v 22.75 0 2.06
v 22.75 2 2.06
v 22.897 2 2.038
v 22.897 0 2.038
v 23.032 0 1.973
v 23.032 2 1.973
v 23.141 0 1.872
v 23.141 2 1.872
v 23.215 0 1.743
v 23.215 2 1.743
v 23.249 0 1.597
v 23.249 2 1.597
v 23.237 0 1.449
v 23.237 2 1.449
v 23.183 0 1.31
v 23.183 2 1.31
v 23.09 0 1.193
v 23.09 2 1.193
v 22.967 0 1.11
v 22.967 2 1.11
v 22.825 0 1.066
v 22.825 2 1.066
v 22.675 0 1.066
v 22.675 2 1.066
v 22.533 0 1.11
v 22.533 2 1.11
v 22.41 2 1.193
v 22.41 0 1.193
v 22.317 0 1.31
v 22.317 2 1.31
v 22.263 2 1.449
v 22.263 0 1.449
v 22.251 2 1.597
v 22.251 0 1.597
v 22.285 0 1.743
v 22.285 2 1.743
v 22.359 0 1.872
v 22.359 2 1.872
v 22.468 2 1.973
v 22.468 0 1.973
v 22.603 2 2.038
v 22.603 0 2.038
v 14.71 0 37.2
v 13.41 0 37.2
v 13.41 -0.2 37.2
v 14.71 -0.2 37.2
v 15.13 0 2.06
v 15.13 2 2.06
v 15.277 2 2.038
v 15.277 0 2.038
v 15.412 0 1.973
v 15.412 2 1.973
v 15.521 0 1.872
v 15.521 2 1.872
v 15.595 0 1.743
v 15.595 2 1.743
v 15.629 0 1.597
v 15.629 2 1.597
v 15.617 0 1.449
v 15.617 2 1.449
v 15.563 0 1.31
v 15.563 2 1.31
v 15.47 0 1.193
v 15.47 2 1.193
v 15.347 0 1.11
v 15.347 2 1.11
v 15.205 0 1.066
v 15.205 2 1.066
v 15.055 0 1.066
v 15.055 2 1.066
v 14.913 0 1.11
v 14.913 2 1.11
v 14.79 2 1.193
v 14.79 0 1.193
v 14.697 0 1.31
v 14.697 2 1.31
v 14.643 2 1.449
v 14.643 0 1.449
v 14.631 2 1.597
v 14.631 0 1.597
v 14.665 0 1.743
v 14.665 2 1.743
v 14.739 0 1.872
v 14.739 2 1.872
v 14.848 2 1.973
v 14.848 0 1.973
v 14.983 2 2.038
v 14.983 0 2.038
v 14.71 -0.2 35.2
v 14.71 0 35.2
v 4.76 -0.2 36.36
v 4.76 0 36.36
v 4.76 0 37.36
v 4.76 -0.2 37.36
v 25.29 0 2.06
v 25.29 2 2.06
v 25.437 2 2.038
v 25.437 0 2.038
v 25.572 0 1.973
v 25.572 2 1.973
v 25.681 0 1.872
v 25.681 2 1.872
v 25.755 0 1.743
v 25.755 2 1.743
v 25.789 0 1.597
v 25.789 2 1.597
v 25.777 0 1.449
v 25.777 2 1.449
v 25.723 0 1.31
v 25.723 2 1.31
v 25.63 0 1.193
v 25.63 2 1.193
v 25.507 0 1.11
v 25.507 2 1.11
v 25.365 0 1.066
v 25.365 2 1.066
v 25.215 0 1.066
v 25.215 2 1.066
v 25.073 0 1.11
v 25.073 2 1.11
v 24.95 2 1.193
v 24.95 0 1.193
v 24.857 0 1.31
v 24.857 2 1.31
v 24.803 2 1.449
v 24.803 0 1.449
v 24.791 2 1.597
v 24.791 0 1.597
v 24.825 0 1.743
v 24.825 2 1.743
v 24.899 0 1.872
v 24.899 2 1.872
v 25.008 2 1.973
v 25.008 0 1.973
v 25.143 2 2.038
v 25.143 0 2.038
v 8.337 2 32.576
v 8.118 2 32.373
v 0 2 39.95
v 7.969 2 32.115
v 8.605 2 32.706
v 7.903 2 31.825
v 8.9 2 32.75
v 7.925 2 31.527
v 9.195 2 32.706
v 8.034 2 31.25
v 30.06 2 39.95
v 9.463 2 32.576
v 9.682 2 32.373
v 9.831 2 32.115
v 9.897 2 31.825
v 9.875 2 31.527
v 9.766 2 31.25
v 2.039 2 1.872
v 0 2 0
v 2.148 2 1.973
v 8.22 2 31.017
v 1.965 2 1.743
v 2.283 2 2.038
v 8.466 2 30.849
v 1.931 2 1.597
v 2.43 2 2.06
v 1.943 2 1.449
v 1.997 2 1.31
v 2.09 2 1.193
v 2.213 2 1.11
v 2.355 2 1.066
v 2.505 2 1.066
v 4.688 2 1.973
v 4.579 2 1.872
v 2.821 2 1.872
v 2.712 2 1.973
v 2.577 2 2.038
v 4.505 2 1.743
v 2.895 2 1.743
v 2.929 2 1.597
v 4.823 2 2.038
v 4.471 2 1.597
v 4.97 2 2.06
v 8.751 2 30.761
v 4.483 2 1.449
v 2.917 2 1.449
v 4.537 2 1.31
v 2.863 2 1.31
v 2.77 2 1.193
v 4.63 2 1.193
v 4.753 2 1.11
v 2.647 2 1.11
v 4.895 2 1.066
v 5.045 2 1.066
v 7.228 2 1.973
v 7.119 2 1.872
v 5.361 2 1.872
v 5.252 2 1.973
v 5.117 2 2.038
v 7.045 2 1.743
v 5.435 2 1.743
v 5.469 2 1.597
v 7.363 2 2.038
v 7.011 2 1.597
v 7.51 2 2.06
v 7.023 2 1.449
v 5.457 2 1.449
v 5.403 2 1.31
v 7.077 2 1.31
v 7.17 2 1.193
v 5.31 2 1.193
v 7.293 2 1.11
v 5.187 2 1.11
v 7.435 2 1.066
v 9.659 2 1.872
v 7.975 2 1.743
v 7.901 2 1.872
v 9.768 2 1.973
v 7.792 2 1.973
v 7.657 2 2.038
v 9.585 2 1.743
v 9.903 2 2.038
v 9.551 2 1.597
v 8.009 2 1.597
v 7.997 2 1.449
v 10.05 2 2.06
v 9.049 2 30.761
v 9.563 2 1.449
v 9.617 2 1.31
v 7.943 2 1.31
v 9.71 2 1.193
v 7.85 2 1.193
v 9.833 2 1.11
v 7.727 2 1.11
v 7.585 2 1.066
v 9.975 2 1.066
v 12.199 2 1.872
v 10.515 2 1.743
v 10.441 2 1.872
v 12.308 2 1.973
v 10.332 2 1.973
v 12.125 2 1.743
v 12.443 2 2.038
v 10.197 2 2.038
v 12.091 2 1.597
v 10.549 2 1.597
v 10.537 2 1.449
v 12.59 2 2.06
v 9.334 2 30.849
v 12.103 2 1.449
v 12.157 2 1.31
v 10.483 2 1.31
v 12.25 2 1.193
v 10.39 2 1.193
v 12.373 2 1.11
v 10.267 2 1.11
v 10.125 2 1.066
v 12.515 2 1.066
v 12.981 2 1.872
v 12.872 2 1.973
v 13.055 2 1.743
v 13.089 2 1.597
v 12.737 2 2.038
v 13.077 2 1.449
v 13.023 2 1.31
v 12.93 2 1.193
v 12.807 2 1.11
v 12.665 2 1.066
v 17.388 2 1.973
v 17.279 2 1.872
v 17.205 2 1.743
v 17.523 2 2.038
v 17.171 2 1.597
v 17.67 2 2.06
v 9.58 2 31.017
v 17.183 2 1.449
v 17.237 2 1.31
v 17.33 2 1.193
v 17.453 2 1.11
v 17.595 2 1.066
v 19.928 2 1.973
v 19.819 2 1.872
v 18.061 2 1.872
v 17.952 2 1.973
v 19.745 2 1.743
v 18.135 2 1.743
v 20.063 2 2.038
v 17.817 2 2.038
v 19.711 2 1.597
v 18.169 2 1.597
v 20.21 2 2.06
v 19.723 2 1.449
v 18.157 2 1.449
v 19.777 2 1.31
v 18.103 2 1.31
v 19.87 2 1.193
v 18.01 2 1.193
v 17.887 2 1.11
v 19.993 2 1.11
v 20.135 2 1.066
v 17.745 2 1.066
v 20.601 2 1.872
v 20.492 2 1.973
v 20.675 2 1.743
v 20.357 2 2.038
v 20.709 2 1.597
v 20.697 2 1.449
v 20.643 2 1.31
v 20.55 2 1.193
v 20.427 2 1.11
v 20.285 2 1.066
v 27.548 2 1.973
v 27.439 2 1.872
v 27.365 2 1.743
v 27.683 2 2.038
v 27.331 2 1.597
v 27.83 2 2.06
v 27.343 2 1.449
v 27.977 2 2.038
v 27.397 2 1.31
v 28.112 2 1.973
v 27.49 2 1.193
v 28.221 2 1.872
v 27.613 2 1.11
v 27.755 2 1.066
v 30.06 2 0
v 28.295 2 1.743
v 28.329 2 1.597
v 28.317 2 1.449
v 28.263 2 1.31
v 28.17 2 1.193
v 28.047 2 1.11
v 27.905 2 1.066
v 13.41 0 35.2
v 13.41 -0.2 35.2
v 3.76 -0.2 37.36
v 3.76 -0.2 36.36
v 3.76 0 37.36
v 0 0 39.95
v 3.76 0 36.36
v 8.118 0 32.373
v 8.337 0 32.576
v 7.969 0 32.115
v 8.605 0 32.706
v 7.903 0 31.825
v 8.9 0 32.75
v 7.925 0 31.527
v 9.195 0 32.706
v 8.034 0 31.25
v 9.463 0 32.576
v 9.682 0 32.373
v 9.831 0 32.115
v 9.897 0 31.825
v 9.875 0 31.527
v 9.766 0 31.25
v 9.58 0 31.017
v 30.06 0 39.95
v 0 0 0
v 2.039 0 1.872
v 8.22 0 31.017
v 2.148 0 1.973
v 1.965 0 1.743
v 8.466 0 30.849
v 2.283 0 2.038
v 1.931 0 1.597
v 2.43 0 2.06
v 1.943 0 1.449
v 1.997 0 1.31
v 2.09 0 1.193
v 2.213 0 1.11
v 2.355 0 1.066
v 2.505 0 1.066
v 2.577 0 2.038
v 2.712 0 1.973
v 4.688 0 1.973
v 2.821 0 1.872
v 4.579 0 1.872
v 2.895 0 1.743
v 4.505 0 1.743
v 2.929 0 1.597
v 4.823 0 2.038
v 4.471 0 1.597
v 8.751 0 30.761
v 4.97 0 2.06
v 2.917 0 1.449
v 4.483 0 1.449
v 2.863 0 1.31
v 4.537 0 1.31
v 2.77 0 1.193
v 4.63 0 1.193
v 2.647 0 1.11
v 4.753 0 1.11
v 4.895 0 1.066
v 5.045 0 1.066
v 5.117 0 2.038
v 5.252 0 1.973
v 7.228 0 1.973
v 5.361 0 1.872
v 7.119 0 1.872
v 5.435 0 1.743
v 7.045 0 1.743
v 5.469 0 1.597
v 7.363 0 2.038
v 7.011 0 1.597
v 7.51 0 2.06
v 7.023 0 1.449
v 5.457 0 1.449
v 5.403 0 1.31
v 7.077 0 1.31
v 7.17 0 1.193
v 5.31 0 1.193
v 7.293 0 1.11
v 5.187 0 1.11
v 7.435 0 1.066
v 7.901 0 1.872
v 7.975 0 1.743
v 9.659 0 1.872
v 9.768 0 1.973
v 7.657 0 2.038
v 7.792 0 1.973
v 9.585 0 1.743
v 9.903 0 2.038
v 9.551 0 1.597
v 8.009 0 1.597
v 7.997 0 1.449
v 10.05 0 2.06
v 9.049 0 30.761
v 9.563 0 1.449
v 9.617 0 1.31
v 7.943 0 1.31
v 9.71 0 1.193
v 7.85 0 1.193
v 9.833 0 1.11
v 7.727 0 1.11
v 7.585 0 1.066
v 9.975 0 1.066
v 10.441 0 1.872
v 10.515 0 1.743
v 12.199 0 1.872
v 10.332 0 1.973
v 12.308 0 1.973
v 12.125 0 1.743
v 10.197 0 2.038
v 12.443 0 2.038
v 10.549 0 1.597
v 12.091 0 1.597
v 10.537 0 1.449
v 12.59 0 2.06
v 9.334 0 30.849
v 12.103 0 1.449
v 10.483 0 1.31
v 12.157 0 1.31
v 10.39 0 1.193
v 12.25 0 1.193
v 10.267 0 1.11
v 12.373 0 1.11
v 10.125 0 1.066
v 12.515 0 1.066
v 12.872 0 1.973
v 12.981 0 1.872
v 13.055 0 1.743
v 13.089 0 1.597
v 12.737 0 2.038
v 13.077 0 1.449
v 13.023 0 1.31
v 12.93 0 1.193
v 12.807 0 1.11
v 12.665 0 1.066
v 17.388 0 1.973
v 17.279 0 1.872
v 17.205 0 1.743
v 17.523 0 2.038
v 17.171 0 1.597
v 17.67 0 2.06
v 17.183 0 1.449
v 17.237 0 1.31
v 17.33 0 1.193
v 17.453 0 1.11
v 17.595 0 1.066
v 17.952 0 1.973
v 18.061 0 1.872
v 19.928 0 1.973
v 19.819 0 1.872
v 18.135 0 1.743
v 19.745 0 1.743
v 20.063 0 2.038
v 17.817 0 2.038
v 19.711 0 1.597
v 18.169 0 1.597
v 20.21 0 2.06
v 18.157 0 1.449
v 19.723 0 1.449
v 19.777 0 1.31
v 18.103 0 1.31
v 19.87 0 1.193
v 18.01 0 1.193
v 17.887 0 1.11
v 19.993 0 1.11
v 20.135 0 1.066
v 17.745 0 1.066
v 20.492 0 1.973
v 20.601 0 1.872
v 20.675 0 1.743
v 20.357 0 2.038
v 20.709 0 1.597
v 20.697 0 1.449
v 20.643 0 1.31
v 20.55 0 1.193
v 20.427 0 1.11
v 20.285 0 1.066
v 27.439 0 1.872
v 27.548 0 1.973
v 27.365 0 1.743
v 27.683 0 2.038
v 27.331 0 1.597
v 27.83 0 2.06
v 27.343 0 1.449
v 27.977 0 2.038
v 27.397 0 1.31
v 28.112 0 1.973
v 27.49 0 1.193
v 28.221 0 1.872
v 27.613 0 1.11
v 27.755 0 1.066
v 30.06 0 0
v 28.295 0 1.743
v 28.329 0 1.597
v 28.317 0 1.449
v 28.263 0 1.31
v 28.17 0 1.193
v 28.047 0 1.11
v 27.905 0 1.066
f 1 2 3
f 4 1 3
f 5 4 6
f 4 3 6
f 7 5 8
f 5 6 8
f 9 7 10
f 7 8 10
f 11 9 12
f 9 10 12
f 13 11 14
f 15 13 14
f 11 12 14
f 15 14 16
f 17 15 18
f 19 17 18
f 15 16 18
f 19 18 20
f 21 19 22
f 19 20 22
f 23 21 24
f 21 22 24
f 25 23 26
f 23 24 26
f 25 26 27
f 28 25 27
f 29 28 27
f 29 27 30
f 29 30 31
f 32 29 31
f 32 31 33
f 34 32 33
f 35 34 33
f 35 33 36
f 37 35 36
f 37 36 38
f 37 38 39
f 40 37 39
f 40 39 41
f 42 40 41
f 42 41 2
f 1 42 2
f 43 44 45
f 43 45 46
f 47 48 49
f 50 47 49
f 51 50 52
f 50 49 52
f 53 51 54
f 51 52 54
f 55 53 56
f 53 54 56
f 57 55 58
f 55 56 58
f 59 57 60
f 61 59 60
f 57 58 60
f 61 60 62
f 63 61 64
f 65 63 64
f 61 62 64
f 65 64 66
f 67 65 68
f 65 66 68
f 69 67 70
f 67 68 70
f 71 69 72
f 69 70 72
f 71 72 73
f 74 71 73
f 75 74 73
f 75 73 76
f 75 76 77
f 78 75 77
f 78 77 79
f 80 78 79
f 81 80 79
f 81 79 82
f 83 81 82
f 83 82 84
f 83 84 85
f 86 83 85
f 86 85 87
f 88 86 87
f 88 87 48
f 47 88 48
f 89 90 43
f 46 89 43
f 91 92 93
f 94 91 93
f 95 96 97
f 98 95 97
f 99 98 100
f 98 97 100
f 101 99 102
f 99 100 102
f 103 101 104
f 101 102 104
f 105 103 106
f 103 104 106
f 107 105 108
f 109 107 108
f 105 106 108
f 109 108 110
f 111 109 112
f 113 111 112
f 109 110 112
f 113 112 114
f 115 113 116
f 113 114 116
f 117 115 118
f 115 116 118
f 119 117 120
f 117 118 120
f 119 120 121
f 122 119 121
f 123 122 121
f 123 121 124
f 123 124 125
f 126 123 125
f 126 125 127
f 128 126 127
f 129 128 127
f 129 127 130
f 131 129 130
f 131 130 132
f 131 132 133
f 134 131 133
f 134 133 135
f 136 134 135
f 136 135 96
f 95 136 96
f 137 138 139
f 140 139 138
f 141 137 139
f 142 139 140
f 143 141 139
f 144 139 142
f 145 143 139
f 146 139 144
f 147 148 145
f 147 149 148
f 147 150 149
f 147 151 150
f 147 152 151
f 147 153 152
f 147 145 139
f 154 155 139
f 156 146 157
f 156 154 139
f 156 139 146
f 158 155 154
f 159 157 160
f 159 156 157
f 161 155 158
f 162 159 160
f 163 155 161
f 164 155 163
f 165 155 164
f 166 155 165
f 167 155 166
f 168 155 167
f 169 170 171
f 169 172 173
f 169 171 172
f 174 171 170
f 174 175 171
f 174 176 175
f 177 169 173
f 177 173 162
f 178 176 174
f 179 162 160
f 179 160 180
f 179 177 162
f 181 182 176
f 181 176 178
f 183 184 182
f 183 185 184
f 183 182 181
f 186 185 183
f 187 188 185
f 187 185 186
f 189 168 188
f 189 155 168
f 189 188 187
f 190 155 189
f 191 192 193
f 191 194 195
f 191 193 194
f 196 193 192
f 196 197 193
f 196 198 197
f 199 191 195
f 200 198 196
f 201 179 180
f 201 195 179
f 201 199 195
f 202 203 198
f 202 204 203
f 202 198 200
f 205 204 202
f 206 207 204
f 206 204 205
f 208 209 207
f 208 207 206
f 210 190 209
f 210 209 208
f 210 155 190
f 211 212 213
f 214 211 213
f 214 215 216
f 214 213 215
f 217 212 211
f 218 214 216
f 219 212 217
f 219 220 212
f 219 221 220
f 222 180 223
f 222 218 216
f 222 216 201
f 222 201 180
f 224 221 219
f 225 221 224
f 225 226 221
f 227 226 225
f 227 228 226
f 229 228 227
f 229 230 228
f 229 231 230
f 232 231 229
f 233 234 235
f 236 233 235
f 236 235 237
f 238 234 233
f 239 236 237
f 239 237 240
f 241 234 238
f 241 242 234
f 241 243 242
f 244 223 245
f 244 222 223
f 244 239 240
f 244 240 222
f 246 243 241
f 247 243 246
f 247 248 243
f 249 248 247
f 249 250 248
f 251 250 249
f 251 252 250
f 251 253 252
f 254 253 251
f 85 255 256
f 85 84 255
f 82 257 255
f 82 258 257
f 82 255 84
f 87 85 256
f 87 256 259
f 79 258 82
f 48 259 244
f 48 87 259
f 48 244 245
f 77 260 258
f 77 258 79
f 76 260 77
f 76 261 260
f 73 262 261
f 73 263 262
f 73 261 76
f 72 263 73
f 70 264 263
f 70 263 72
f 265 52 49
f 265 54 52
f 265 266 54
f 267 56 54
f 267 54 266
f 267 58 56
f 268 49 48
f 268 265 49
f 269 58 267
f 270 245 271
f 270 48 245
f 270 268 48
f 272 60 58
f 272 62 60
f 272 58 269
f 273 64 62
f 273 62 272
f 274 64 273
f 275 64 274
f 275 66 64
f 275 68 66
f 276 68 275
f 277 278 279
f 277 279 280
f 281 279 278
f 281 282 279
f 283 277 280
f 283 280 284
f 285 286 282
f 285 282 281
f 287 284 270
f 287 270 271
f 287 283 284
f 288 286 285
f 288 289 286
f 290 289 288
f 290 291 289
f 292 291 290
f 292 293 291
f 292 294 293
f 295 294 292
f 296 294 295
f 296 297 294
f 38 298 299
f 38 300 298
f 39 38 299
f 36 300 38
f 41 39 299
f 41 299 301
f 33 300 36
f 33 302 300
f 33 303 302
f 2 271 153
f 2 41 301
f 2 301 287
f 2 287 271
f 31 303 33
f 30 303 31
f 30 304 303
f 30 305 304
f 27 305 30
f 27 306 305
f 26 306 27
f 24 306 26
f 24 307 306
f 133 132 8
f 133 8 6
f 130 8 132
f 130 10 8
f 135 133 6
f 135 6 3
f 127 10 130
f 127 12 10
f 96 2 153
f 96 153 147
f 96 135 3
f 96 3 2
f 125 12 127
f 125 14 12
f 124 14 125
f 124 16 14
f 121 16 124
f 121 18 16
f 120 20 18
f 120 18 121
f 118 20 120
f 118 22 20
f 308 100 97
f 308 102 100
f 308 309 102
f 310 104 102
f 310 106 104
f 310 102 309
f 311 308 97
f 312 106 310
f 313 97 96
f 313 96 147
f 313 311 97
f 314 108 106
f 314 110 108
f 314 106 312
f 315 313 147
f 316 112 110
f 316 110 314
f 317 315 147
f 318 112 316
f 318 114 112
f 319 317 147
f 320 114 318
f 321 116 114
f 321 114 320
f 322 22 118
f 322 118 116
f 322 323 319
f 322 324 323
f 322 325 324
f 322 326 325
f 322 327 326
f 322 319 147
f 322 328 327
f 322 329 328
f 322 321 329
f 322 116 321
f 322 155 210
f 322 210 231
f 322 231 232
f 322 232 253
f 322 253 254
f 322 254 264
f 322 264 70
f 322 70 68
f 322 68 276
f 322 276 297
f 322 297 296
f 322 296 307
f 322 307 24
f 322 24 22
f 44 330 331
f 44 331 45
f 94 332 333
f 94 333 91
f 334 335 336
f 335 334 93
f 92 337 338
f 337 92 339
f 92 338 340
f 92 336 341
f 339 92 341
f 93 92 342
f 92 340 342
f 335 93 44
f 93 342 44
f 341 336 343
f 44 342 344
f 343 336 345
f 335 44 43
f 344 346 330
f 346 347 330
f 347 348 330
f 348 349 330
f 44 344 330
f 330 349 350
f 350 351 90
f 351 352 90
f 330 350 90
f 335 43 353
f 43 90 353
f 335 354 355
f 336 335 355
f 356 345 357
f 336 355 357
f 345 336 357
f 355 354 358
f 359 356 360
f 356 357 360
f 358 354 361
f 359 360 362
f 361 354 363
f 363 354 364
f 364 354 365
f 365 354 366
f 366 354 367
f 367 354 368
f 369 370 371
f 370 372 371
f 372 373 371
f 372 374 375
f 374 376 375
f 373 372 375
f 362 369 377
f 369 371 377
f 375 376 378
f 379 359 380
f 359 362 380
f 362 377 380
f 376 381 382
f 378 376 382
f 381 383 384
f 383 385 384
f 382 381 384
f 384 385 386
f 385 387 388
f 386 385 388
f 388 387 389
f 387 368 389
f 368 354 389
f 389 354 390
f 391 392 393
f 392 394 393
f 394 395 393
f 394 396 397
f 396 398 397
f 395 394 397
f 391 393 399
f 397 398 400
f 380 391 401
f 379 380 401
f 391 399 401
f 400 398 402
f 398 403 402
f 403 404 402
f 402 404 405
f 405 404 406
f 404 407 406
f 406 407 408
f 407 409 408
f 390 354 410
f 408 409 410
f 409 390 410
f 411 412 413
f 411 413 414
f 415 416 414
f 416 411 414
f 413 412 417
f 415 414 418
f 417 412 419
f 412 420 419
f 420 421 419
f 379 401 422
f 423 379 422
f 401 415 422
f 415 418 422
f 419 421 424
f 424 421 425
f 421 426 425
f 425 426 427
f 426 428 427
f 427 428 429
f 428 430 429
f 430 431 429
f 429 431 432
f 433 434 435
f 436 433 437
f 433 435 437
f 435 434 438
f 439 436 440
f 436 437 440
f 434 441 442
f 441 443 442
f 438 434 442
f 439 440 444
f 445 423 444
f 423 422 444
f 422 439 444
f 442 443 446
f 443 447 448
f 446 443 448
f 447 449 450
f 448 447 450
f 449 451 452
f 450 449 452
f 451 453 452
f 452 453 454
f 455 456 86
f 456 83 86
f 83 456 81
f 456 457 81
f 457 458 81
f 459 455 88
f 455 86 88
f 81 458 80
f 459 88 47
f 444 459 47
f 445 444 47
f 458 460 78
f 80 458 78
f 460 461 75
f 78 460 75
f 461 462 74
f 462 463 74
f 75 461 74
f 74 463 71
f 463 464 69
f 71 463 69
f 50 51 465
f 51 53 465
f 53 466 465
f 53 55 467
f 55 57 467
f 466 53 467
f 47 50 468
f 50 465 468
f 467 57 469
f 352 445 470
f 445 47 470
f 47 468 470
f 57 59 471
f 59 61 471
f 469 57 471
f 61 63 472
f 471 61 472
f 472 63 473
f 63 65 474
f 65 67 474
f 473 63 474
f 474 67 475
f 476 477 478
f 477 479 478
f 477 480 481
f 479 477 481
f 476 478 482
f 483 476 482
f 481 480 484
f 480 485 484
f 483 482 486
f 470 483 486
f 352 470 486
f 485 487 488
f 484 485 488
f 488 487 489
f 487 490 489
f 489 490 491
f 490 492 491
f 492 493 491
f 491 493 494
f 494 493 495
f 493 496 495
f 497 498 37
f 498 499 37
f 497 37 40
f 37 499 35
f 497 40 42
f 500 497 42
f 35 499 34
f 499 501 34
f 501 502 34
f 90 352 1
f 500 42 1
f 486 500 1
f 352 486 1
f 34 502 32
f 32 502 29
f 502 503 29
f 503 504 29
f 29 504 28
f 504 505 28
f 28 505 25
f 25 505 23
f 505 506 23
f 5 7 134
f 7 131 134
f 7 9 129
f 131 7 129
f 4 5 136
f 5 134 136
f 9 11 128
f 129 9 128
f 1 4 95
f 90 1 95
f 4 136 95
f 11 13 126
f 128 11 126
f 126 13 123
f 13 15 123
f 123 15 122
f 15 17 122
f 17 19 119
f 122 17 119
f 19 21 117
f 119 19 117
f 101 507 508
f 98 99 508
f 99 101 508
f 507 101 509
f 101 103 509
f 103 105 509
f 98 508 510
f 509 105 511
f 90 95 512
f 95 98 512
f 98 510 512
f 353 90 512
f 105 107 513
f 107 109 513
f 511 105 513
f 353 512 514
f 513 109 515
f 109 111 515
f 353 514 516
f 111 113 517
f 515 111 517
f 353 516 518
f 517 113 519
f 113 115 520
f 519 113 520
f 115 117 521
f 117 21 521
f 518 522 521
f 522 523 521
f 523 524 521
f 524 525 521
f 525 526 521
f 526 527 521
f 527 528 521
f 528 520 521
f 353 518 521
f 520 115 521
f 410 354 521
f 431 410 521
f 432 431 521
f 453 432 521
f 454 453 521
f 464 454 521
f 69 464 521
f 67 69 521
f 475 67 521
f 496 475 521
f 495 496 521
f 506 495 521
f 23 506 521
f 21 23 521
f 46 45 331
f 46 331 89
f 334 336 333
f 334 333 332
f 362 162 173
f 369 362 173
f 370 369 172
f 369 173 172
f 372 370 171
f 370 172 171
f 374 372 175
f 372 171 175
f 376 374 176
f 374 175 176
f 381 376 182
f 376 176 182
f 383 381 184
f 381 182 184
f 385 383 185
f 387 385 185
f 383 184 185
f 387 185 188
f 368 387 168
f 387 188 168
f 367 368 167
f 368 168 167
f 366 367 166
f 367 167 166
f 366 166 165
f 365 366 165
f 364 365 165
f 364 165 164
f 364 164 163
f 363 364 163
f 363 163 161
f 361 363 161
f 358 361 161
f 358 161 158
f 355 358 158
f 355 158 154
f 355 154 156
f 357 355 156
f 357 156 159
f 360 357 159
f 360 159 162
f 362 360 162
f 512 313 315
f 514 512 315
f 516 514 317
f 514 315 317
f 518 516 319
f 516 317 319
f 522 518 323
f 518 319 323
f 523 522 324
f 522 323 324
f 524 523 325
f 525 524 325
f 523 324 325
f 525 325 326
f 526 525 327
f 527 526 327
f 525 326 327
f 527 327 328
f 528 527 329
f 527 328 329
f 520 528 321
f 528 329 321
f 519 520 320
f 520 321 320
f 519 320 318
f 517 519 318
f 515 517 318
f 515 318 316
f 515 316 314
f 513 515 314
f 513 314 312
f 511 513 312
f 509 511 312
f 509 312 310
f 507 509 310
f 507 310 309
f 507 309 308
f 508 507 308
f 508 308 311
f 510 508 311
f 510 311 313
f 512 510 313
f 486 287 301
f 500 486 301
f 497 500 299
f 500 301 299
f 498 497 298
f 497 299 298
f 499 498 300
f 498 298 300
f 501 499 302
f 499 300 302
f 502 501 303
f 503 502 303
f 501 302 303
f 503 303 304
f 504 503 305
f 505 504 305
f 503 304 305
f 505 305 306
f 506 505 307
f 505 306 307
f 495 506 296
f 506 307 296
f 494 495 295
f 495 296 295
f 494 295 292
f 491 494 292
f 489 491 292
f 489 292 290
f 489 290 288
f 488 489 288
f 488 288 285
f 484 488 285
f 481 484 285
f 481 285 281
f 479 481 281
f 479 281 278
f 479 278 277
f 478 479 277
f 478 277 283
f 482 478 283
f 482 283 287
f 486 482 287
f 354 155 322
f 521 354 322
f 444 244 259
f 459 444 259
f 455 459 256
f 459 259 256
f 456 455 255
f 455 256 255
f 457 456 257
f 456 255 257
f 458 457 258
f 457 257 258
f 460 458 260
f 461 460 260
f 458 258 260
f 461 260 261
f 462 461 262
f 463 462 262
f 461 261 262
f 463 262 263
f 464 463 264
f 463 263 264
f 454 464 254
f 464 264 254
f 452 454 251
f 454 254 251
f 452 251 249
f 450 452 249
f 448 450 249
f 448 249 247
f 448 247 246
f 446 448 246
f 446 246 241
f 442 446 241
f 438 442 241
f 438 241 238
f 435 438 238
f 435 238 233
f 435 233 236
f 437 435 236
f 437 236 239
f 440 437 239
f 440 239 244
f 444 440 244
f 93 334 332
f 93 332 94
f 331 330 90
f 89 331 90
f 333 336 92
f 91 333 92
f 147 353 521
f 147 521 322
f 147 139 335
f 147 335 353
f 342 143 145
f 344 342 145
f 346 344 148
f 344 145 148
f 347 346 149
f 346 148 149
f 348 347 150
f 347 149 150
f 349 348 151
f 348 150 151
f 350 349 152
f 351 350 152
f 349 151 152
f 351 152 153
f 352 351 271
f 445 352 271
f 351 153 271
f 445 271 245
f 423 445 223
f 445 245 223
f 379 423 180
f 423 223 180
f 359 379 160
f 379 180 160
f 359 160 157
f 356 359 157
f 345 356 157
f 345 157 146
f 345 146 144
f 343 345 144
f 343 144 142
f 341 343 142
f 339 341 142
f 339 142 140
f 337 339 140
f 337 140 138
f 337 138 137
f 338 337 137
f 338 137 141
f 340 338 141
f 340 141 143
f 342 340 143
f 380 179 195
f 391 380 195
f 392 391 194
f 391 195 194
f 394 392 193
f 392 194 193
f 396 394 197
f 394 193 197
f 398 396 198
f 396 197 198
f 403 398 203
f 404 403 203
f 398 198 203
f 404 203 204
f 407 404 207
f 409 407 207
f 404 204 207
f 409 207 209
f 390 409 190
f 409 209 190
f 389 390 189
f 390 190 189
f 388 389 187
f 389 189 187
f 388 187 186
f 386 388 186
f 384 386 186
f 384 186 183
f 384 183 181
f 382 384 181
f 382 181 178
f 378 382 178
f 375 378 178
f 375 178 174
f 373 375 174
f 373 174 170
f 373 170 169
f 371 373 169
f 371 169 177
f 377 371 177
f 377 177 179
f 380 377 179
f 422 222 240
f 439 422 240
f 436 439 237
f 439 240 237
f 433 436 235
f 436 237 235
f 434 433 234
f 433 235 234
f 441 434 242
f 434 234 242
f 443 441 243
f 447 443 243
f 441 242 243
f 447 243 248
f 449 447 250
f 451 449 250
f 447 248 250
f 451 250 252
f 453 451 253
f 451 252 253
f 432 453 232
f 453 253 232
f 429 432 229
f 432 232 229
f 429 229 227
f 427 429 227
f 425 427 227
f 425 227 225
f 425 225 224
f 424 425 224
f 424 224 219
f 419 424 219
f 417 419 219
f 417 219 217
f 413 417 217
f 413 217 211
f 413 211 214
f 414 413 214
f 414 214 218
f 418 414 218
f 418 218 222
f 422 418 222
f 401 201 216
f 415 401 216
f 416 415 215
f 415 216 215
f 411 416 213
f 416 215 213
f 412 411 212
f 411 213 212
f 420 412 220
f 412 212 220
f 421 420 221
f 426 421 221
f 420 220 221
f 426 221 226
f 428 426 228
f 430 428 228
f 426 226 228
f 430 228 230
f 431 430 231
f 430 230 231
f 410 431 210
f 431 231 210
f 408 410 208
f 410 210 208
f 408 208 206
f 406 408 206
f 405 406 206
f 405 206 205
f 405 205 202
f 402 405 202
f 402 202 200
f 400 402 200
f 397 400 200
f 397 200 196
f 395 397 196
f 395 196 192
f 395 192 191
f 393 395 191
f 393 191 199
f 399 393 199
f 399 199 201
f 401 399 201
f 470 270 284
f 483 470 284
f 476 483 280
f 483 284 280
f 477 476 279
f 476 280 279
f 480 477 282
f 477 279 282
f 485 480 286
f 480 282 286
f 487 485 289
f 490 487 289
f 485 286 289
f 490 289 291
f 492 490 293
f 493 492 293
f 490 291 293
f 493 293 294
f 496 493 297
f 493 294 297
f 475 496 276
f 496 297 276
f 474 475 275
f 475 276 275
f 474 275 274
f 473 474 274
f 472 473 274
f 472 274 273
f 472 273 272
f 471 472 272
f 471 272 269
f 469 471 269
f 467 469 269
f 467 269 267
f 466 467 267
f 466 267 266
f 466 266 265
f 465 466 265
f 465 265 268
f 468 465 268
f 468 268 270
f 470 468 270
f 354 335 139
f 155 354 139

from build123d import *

# Parameters (mm, degrees)
SKETCH1_W           = 30.06
SKETCH1_H           = 2
BOSS_EXTRUDE1_DEPTH = 39.95
SKETCH2_R           = 1
CUT_EXTRUDE1_DEPTH  = 39.95
SKETCH3_R           = 0.5
CUT_EXTRUDE2_DEPTH  = 4.5
LPATTERN1_COUNT     = 11
LPATTERN1_PITCH     = 2.54
SKETCH4_W           = 1.3
SKETCH4_H           = 2
BOSS_EXTRUDE2_DEPTH = 0.2
SKETCH5_W           = 1
SKETCH5_H           = 1
BOSS_EXTRUDE3_DEPTH = 0.2


with BuildPart() as part:
    # Sketch1 → Boss-Extrude1 (new body)
    with BuildSketch(Plane.XY):
        with Locations((15.03, 1)):
            Rectangle(SKETCH1_W, SKETCH1_H)
    extrude(amount=BOSS_EXTRUDE1_DEPTH)

    # Sketch2 → Cut-Extrude1 (cut)
    with BuildSketch(Plane(origin=(0, 2, 0), x_dir=(1, 0, 0), z_dir=(0, 1, 0))):
        with Locations(Location((8.9, -31.75, 0), (0, 0, 270))):
            Circle(SKETCH2_R)
    extrude(amount=-CUT_EXTRUDE1_DEPTH, mode=Mode.SUBTRACT)

    # Sketch3 → Cut-Extrude2 (cut)
    with BuildSketch(Plane(origin=(0, 2, 0), x_dir=(1, 0, 0), z_dir=(0, 1, 0))):
        with Locations(Location((27.83, -1.56, 0), (0, 0, 270))):
            Circle(SKETCH3_R)
    cut_extrude2 = extrude(amount=-CUT_EXTRUDE2_DEPTH, mode=Mode.SUBTRACT)

    # LPattern1: Cut-Extrude2 ×11
    with Locations(*[(-i * LPATTERN1_PITCH, 0, 0) for i in range(1, LPATTERN1_COUNT)]):
        add(cut_extrude2, mode=Mode.SUBTRACT)

    # Sketch4 → Boss-Extrude2 (add)
    with BuildSketch(Plane.XZ):
        with Locations((14.06, 36.2)):
            Rectangle(SKETCH4_W, SKETCH4_H)
    extrude(amount=BOSS_EXTRUDE2_DEPTH)

    # Sketch5 → Boss-Extrude3 (add)
    with BuildSketch(Plane.XZ):
        with Locations((4.26, 36.86)):
            Rectangle(SKETCH5_W, SKETCH5_H)
    extrude(amount=BOSS_EXTRUDE3_DEPTH)


solid = part.part
